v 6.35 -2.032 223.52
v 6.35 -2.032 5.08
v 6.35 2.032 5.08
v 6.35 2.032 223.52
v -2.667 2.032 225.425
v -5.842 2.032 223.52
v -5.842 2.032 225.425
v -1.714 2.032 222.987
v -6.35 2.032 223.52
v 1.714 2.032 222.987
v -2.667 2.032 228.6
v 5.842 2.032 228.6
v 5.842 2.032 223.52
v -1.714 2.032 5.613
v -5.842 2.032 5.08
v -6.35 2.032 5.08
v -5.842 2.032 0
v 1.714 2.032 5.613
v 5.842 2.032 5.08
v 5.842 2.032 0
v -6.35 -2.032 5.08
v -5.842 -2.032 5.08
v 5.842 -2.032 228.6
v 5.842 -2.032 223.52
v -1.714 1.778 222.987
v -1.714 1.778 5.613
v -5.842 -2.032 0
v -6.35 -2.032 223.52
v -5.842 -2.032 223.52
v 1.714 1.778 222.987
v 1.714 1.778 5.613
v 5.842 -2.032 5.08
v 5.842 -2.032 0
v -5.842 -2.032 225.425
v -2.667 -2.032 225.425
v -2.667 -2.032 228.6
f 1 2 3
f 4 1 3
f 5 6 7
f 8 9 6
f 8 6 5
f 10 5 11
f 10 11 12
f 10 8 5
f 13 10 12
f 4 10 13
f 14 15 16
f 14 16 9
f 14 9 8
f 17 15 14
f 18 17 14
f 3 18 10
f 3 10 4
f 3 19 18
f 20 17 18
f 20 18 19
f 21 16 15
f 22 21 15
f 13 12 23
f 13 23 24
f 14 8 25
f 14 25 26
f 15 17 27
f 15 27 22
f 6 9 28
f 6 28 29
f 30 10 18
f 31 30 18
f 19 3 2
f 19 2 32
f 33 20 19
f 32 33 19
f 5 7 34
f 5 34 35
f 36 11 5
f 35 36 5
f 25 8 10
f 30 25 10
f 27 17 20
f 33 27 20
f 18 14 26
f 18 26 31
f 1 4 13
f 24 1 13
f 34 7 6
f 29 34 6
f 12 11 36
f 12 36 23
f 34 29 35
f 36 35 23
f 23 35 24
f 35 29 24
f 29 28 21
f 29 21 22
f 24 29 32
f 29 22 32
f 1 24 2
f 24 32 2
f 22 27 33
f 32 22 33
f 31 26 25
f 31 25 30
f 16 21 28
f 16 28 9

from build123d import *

# Parameters (mm, degrees)
SKETCH1_W               = 12.7
SKETCH1_H               = 4.064
BOSS_EXTRUDE1_DEPTH     = 228.6
SKETCH2_W               = 3.429
SKETCH2_H               = 217.3732
CUT_EXTRUDE1_DEPTH      = 0.254
SKETCH3_W               = 0.508
SKETCH3_H               = 5.08
CUT_EXTRUDE2_DEPTH      = 229.724285103
MIRROR2_COPY_1_SKETCH_W = 0.508
MIRROR2_COPY_1_SKETCH_H = 5.08
MIRROR2_COPY_1_DEPTH    = 229.724285103
SKETCH4_W               = 3.175
SKETCH4_H               = 3.175
CUT_EXTRUDE3_DEPTH      = 229.724285103


with BuildPart() as part:
    # Sketch1 → Boss-Extrude1 (new body)
    with BuildSketch(Plane.XY):
        Rectangle(SKETCH1_W, SKETCH1_H)
    extrude(amount=BOSS_EXTRUDE1_DEPTH)

    # Sketch2 → Cut-Extrude1 (cut)
    with BuildSketch(Plane(origin=(0, 2.032, 0), x_dir=(1, 0, 0), z_dir=(0, 1, 0))):
        with Locations((0, -114.3)):
            Rectangle(SKETCH2_W, SKETCH2_H)
    extrude(amount=-CUT_EXTRUDE1_DEPTH, mode=Mode.SUBTRACT)

    # Sketch3 → Cut-Extrude2 (cut, through all)
    with BuildSketch(Plane(origin=(0, 2.032, 0), x_dir=(1, 0, 0), z_dir=(0, 1, 0))):
        with Locations((-6.096, -226.06)):
            Rectangle(SKETCH3_W, SKETCH3_H)
    cut_extrude2 = extrude(amount=-CUT_EXTRUDE2_DEPTH, mode=Mode.SUBTRACT)

    # Mirror1: Cut-Extrude2 across plane
    add(cut_extrude2.mirror(Plane(origin=(0, 0, 114.3), x_dir=(1, 0, 0), z_dir=(0, 0, -1))), mode=Mode.SUBTRACT)

    # Mirror2: Cut-Extrude2 across plane
    add(cut_extrude2.mirror(Plane(origin=(0, 0, 0), x_dir=(0, 0, 1), z_dir=(1, 0, 0))), mode=Mode.SUBTRACT)

    # Mirror2 copy 1 sketch → Mirror2 copy 1 (cut, through all)
    with BuildSketch(Plane(origin=(0, 2.032, 228.6), x_dir=(-1, 0, 0), z_dir=(0, 1, 0))):
        with Locations((-6.096, -226.06)):
            Rectangle(MIRROR2_COPY_1_SKETCH_W, MIRROR2_COPY_1_SKETCH_H)
    extrude(amount=-MIRROR2_COPY_1_DEPTH, mode=Mode.SUBTRACT)

    # Sketch4 → Cut-Extrude3 (cut, through all)
    with BuildSketch(Plane(origin=(0, 2.032, 0), x_dir=(1, 0, 0), z_dir=(0, 1, 0))):
        with Locations((-4.2545, -227.0125)):
            Rectangle(SKETCH4_W, SKETCH4_H)
    extrude(amount=-CUT_EXTRUDE3_DEPTH, mode=Mode.SUBTRACT)


solid = part.part
